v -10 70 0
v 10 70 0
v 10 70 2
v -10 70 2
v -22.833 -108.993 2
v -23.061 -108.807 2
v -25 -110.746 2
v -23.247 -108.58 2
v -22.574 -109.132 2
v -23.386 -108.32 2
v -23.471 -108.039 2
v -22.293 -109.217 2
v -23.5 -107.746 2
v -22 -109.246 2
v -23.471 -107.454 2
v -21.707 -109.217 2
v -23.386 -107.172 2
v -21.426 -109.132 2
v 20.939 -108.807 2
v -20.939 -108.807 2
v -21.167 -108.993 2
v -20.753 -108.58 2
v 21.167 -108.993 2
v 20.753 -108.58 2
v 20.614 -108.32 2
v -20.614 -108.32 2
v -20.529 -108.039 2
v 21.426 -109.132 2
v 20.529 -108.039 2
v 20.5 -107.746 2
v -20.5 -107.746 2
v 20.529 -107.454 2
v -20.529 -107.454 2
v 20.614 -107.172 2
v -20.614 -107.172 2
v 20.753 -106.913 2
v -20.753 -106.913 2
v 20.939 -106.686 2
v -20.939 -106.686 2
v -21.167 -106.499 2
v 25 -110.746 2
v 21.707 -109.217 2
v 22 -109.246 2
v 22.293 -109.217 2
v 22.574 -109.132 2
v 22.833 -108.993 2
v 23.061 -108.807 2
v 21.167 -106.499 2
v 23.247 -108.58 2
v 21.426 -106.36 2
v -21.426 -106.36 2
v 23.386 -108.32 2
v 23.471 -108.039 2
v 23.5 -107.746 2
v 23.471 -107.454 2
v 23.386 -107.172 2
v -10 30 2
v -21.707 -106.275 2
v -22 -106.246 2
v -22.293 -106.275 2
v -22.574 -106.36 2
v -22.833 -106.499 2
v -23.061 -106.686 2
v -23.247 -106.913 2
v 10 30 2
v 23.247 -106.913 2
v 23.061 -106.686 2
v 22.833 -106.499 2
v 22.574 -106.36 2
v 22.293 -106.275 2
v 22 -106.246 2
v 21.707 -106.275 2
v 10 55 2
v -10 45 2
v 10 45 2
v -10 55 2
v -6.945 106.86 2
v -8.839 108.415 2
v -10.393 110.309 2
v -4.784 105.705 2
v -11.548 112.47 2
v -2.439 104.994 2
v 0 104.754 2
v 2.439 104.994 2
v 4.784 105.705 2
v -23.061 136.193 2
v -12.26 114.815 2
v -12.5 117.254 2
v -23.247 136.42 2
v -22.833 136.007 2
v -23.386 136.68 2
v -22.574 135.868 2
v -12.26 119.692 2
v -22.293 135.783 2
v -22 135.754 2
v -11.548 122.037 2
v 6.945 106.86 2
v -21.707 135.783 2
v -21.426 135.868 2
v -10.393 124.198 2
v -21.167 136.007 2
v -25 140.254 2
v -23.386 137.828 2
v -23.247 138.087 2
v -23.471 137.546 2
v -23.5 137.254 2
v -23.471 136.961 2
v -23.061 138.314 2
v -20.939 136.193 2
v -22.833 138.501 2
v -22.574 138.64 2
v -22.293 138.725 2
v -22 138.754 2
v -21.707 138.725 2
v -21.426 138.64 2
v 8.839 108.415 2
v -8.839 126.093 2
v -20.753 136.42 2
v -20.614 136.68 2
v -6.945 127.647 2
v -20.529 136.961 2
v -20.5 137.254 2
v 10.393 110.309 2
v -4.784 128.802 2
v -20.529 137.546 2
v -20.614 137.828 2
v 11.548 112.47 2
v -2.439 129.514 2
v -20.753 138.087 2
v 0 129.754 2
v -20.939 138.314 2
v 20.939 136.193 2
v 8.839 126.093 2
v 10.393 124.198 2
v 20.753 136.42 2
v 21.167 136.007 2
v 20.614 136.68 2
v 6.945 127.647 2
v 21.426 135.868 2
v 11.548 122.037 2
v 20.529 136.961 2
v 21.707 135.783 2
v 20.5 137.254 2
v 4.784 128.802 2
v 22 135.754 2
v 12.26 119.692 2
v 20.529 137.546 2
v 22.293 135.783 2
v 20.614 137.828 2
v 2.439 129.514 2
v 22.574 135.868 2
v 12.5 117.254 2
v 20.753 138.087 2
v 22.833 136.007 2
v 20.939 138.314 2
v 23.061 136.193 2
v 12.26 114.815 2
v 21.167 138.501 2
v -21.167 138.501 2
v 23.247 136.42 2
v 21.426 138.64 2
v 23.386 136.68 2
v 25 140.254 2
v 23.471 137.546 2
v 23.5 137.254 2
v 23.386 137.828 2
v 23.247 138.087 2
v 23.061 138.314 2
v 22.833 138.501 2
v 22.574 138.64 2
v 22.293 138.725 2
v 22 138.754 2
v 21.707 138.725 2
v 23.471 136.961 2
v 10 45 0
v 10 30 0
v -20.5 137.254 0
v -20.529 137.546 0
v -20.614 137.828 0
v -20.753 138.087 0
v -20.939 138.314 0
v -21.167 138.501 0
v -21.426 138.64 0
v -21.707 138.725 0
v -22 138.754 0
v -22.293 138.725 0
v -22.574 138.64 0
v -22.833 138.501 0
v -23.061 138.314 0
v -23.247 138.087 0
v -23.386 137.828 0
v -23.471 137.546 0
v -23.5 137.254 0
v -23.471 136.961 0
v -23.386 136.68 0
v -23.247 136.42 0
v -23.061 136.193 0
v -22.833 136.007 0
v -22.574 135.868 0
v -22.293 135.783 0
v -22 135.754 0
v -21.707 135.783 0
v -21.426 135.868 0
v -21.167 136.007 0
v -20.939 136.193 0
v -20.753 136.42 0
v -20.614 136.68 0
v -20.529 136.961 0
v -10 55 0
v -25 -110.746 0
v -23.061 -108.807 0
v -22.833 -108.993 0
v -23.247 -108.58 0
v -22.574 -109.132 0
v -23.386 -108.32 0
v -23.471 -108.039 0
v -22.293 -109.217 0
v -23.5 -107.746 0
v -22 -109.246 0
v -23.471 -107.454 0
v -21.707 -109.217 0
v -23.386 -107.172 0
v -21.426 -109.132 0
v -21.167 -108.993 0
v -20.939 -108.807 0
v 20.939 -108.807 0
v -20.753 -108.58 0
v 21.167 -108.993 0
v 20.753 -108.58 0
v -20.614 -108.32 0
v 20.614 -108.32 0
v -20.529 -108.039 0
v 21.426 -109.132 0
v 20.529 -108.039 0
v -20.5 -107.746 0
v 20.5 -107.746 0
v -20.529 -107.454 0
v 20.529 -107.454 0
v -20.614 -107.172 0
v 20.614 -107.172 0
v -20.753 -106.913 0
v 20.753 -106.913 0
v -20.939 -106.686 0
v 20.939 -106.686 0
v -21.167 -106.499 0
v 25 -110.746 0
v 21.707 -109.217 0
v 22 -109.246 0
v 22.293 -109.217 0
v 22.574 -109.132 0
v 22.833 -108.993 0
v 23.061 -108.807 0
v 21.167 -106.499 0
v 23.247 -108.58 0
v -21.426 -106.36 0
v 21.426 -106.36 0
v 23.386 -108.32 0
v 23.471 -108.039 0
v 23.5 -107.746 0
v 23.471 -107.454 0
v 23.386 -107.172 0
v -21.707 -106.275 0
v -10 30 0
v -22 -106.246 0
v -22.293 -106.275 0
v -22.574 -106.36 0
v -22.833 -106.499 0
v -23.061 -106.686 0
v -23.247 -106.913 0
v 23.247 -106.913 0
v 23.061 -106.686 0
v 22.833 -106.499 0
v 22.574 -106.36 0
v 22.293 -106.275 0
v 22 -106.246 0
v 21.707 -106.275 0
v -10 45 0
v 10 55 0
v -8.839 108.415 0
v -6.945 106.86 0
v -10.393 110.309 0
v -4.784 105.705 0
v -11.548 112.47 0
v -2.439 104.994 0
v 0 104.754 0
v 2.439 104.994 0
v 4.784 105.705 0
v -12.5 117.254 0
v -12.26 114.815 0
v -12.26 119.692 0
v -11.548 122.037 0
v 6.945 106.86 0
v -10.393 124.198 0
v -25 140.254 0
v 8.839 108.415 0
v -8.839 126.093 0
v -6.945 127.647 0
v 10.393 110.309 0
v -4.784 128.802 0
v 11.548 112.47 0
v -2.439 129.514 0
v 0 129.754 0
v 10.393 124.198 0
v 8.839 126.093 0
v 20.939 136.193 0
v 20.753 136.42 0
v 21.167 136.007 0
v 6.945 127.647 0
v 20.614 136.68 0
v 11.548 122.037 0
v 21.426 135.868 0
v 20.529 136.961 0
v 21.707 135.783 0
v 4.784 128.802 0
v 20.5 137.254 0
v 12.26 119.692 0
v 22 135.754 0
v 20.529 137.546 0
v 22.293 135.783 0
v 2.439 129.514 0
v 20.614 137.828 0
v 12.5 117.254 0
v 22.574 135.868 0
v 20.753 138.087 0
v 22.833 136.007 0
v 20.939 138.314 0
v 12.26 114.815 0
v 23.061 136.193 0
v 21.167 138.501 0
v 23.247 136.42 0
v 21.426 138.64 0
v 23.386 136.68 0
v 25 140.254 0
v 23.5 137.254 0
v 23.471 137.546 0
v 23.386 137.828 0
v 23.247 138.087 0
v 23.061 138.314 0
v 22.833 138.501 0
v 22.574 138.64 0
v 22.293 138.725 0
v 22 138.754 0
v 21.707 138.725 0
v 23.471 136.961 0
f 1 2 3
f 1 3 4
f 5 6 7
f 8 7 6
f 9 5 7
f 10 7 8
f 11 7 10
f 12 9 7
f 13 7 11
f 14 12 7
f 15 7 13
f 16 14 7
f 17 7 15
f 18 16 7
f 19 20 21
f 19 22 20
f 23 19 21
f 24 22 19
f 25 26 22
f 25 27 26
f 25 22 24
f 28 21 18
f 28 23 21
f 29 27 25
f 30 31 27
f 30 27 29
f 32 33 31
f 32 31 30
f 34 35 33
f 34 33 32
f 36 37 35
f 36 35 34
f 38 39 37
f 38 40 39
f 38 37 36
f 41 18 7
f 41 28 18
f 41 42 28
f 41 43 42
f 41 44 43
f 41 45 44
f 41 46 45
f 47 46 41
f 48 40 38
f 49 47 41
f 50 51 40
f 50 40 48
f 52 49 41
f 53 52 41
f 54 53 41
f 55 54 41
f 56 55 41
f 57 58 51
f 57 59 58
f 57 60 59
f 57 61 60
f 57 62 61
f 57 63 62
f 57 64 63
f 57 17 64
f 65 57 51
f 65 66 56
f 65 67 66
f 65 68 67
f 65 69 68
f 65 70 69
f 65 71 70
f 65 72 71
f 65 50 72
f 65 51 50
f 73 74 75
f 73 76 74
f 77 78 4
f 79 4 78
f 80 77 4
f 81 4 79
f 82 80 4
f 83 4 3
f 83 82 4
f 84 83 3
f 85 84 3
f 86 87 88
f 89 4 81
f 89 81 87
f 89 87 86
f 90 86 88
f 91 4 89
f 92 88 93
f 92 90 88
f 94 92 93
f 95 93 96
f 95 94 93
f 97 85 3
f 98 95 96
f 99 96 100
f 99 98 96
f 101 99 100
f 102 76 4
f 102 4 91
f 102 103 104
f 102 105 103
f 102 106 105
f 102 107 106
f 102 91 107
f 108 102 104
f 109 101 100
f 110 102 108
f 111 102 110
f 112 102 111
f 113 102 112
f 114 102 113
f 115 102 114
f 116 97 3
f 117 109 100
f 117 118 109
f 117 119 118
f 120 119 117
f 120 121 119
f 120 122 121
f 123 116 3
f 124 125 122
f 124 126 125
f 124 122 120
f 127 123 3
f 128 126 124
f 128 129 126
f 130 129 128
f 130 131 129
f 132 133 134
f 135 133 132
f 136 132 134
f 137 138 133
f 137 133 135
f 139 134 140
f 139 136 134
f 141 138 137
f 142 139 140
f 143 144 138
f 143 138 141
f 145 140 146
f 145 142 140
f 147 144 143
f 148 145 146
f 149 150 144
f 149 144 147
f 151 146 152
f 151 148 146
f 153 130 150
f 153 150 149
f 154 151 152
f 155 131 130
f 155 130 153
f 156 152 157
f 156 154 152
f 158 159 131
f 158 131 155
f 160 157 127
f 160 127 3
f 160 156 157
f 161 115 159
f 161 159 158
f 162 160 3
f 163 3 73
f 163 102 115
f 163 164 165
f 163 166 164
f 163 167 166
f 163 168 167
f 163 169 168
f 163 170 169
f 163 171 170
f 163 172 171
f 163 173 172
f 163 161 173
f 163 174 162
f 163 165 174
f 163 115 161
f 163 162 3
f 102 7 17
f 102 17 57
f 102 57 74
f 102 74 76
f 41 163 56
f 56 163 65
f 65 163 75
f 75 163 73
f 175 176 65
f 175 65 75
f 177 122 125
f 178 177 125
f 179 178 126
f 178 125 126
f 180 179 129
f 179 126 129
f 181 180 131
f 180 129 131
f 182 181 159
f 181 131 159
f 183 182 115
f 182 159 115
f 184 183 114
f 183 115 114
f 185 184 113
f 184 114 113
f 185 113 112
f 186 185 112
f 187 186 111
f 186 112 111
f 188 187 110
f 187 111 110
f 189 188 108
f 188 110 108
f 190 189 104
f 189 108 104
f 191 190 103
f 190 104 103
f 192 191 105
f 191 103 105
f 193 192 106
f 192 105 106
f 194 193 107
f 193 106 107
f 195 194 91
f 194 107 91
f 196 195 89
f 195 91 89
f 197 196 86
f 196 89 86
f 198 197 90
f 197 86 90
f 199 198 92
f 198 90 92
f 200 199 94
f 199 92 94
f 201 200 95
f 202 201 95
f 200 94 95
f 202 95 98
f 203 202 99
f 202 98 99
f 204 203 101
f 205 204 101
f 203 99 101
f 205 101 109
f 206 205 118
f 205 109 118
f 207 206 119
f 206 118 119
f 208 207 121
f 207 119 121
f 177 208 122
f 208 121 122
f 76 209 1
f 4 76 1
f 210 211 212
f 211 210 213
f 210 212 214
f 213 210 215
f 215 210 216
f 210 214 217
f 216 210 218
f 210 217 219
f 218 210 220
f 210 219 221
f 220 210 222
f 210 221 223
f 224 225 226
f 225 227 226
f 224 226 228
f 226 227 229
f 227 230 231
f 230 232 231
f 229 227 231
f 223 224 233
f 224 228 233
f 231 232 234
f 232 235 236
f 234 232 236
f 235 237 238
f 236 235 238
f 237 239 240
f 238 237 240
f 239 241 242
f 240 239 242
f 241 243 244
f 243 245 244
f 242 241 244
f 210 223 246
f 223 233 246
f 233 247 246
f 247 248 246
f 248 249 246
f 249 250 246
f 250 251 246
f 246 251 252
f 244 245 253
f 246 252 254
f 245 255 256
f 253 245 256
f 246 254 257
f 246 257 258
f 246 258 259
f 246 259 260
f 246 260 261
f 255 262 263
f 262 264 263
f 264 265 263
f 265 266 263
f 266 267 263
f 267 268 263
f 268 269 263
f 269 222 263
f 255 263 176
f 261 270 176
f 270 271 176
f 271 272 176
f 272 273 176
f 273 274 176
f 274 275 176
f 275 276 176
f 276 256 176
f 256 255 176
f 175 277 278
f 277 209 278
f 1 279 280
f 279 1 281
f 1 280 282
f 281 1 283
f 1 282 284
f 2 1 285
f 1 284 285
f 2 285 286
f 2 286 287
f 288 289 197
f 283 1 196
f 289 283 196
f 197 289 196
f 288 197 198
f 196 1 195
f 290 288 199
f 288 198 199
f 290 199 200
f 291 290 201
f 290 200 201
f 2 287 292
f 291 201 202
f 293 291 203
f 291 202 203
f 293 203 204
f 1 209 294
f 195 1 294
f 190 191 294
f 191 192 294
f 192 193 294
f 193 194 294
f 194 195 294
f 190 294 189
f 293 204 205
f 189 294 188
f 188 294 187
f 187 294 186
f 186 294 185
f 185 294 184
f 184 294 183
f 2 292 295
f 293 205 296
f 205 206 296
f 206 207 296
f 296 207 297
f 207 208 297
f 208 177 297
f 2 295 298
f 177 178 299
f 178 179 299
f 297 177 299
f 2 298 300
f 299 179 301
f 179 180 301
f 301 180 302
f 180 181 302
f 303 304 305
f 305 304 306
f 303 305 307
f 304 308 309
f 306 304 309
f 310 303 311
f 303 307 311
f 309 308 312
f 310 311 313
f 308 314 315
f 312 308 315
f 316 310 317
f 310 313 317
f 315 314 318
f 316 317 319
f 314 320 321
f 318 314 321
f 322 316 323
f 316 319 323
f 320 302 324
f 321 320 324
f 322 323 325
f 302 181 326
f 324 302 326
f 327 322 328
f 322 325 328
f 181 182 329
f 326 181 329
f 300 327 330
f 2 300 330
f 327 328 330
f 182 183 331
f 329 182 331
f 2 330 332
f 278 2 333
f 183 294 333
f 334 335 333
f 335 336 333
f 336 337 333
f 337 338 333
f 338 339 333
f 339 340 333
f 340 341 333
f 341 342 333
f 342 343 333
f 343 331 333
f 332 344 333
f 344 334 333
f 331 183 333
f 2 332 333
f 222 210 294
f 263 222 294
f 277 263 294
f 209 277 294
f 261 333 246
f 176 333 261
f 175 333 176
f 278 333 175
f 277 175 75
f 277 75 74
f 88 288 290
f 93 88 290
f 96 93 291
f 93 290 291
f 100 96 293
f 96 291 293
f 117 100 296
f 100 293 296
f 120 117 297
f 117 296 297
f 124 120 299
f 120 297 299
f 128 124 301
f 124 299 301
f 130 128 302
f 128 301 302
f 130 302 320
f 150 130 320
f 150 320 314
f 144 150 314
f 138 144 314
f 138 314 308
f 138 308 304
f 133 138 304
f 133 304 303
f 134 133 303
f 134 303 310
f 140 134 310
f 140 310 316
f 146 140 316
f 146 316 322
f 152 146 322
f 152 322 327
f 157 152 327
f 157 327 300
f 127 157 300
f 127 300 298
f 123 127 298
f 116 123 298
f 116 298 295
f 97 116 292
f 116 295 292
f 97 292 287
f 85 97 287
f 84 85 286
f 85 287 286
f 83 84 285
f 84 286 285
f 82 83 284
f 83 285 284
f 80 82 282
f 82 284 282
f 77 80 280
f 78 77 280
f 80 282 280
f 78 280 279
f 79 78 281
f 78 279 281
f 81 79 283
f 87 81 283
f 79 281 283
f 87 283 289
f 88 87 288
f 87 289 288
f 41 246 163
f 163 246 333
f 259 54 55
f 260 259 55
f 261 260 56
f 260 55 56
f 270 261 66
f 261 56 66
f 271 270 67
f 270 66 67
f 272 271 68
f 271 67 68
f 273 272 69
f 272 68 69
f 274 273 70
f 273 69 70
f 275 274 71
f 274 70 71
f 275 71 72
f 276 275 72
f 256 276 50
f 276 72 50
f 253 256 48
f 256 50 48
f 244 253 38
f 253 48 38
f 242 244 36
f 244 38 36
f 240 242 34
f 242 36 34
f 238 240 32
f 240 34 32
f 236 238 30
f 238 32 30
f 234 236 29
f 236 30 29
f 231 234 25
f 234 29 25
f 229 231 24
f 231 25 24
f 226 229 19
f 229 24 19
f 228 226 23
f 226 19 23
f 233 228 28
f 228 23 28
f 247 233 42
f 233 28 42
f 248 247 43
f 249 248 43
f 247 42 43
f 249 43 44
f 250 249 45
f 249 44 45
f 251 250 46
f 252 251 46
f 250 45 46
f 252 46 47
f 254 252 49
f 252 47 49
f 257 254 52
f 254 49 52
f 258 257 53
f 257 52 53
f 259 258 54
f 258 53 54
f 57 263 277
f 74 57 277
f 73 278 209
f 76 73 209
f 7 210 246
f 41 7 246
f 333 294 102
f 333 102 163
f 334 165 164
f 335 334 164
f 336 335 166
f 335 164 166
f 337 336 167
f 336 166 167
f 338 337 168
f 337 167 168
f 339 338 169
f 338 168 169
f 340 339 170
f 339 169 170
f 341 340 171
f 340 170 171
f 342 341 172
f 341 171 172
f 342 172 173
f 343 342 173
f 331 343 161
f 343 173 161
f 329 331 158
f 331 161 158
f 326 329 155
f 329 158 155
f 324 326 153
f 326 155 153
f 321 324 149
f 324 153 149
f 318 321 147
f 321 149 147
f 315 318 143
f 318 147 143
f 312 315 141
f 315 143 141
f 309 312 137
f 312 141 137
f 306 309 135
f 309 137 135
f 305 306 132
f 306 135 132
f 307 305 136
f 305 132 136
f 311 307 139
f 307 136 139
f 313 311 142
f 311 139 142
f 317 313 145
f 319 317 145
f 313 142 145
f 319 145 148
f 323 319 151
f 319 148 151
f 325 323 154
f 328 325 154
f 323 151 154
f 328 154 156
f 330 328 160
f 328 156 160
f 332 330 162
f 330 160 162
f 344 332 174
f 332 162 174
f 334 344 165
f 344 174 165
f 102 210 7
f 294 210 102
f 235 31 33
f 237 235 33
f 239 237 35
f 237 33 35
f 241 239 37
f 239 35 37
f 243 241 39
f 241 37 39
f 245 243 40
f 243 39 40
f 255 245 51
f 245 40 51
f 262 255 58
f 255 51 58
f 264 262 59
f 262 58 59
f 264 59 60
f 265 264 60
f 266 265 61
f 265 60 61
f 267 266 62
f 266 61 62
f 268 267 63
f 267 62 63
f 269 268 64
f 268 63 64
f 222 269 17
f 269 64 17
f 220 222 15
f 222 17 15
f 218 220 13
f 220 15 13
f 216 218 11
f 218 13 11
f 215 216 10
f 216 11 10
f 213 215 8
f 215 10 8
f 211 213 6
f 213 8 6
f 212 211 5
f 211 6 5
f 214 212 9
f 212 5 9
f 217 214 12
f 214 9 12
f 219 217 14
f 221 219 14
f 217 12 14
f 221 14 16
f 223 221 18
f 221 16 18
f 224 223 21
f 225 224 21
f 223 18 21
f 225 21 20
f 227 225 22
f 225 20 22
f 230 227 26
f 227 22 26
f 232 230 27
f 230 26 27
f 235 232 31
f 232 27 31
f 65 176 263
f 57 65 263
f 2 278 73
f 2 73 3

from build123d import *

# Parameters (mm, degrees)
SKETCH1_W           = 50
SKETCH1_H           = 251
BOSS_EXTRUDE1_DEPTH = 2
CUT_EXTRUDE1_REACH  = 130.472
SKETCH2_R           = 12.5
SKETCH6_R           = 1.5
CUT_EXTRUDE5_DEPTH  = 2
SKETCH8_W           = 20
SKETCH8_H           = 15
CUT_EXTRUDE6_DEPTH  = 2


with BuildPart() as part:
    # Sketch1 → Boss-Extrude1 (new body)
    with BuildSketch(Plane(origin=(0, 15.253788563, 0), x_dir=(1, 0, 0), z_dir=(0, 0, 1))):
        with Locations((0, -0.5)):
            Rectangle(SKETCH1_W, SKETCH1_H)
    extrude(amount=BOSS_EXTRUDE1_DEPTH)

    # Sketch2 → Cut-Extrude1 (cut, up to next)
    with BuildSketch(Plane(origin=(0, 15.253788563, 0), x_dir=(-1, 0, 0), z_dir=(0, 0, -1)), mode=Mode.PRIVATE) as cut_extrude1_sk1:
        with Locations((0, 102)):
            Circle(SKETCH2_R)
    cut_extrude1_tool1 = extrude(cut_extrude1_sk1.sketch, amount=-CUT_EXTRUDE1_REACH, mode=Mode.PRIVATE) & part.part
    add(cut_extrude1_tool1.solids().sort_by_distance((0, 117.253789, 0))[0], mode=Mode.SUBTRACT)

    # Sketch6 → Cut-Extrude5 (cut)
    with BuildSketch(Plane(origin=(0, 15.253788563, 2), x_dir=(1, 0, 0), z_dir=(0, 0, 1))):
        with Locations((-22, 122)):
            Circle(SKETCH6_R)
        with Locations((22, 122)):
            Circle(SKETCH6_R)
        with Locations((-22, -123)):
            Circle(SKETCH6_R)
        with Locations((22, -123)):
            Circle(SKETCH6_R)
    extrude(amount=-CUT_EXTRUDE5_DEPTH, mode=Mode.SUBTRACT)

    # Sketch8 → Cut-Extrude6 (cut)
    with BuildSketch(Plane(origin=(0, 0, 0), x_dir=(-1, 0, 0), z_dir=(0, 0, -1))):
        with Locations((0, 62.5)):
            Rectangle(SKETCH8_W, SKETCH8_H)
        with Locations((0, 37.5)):
            Rectangle(SKETCH8_W, SKETCH8_H)
    extrude(amount=-CUT_EXTRUDE6_DEPTH, mode=Mode.SUBTRACT)


solid = part.part
